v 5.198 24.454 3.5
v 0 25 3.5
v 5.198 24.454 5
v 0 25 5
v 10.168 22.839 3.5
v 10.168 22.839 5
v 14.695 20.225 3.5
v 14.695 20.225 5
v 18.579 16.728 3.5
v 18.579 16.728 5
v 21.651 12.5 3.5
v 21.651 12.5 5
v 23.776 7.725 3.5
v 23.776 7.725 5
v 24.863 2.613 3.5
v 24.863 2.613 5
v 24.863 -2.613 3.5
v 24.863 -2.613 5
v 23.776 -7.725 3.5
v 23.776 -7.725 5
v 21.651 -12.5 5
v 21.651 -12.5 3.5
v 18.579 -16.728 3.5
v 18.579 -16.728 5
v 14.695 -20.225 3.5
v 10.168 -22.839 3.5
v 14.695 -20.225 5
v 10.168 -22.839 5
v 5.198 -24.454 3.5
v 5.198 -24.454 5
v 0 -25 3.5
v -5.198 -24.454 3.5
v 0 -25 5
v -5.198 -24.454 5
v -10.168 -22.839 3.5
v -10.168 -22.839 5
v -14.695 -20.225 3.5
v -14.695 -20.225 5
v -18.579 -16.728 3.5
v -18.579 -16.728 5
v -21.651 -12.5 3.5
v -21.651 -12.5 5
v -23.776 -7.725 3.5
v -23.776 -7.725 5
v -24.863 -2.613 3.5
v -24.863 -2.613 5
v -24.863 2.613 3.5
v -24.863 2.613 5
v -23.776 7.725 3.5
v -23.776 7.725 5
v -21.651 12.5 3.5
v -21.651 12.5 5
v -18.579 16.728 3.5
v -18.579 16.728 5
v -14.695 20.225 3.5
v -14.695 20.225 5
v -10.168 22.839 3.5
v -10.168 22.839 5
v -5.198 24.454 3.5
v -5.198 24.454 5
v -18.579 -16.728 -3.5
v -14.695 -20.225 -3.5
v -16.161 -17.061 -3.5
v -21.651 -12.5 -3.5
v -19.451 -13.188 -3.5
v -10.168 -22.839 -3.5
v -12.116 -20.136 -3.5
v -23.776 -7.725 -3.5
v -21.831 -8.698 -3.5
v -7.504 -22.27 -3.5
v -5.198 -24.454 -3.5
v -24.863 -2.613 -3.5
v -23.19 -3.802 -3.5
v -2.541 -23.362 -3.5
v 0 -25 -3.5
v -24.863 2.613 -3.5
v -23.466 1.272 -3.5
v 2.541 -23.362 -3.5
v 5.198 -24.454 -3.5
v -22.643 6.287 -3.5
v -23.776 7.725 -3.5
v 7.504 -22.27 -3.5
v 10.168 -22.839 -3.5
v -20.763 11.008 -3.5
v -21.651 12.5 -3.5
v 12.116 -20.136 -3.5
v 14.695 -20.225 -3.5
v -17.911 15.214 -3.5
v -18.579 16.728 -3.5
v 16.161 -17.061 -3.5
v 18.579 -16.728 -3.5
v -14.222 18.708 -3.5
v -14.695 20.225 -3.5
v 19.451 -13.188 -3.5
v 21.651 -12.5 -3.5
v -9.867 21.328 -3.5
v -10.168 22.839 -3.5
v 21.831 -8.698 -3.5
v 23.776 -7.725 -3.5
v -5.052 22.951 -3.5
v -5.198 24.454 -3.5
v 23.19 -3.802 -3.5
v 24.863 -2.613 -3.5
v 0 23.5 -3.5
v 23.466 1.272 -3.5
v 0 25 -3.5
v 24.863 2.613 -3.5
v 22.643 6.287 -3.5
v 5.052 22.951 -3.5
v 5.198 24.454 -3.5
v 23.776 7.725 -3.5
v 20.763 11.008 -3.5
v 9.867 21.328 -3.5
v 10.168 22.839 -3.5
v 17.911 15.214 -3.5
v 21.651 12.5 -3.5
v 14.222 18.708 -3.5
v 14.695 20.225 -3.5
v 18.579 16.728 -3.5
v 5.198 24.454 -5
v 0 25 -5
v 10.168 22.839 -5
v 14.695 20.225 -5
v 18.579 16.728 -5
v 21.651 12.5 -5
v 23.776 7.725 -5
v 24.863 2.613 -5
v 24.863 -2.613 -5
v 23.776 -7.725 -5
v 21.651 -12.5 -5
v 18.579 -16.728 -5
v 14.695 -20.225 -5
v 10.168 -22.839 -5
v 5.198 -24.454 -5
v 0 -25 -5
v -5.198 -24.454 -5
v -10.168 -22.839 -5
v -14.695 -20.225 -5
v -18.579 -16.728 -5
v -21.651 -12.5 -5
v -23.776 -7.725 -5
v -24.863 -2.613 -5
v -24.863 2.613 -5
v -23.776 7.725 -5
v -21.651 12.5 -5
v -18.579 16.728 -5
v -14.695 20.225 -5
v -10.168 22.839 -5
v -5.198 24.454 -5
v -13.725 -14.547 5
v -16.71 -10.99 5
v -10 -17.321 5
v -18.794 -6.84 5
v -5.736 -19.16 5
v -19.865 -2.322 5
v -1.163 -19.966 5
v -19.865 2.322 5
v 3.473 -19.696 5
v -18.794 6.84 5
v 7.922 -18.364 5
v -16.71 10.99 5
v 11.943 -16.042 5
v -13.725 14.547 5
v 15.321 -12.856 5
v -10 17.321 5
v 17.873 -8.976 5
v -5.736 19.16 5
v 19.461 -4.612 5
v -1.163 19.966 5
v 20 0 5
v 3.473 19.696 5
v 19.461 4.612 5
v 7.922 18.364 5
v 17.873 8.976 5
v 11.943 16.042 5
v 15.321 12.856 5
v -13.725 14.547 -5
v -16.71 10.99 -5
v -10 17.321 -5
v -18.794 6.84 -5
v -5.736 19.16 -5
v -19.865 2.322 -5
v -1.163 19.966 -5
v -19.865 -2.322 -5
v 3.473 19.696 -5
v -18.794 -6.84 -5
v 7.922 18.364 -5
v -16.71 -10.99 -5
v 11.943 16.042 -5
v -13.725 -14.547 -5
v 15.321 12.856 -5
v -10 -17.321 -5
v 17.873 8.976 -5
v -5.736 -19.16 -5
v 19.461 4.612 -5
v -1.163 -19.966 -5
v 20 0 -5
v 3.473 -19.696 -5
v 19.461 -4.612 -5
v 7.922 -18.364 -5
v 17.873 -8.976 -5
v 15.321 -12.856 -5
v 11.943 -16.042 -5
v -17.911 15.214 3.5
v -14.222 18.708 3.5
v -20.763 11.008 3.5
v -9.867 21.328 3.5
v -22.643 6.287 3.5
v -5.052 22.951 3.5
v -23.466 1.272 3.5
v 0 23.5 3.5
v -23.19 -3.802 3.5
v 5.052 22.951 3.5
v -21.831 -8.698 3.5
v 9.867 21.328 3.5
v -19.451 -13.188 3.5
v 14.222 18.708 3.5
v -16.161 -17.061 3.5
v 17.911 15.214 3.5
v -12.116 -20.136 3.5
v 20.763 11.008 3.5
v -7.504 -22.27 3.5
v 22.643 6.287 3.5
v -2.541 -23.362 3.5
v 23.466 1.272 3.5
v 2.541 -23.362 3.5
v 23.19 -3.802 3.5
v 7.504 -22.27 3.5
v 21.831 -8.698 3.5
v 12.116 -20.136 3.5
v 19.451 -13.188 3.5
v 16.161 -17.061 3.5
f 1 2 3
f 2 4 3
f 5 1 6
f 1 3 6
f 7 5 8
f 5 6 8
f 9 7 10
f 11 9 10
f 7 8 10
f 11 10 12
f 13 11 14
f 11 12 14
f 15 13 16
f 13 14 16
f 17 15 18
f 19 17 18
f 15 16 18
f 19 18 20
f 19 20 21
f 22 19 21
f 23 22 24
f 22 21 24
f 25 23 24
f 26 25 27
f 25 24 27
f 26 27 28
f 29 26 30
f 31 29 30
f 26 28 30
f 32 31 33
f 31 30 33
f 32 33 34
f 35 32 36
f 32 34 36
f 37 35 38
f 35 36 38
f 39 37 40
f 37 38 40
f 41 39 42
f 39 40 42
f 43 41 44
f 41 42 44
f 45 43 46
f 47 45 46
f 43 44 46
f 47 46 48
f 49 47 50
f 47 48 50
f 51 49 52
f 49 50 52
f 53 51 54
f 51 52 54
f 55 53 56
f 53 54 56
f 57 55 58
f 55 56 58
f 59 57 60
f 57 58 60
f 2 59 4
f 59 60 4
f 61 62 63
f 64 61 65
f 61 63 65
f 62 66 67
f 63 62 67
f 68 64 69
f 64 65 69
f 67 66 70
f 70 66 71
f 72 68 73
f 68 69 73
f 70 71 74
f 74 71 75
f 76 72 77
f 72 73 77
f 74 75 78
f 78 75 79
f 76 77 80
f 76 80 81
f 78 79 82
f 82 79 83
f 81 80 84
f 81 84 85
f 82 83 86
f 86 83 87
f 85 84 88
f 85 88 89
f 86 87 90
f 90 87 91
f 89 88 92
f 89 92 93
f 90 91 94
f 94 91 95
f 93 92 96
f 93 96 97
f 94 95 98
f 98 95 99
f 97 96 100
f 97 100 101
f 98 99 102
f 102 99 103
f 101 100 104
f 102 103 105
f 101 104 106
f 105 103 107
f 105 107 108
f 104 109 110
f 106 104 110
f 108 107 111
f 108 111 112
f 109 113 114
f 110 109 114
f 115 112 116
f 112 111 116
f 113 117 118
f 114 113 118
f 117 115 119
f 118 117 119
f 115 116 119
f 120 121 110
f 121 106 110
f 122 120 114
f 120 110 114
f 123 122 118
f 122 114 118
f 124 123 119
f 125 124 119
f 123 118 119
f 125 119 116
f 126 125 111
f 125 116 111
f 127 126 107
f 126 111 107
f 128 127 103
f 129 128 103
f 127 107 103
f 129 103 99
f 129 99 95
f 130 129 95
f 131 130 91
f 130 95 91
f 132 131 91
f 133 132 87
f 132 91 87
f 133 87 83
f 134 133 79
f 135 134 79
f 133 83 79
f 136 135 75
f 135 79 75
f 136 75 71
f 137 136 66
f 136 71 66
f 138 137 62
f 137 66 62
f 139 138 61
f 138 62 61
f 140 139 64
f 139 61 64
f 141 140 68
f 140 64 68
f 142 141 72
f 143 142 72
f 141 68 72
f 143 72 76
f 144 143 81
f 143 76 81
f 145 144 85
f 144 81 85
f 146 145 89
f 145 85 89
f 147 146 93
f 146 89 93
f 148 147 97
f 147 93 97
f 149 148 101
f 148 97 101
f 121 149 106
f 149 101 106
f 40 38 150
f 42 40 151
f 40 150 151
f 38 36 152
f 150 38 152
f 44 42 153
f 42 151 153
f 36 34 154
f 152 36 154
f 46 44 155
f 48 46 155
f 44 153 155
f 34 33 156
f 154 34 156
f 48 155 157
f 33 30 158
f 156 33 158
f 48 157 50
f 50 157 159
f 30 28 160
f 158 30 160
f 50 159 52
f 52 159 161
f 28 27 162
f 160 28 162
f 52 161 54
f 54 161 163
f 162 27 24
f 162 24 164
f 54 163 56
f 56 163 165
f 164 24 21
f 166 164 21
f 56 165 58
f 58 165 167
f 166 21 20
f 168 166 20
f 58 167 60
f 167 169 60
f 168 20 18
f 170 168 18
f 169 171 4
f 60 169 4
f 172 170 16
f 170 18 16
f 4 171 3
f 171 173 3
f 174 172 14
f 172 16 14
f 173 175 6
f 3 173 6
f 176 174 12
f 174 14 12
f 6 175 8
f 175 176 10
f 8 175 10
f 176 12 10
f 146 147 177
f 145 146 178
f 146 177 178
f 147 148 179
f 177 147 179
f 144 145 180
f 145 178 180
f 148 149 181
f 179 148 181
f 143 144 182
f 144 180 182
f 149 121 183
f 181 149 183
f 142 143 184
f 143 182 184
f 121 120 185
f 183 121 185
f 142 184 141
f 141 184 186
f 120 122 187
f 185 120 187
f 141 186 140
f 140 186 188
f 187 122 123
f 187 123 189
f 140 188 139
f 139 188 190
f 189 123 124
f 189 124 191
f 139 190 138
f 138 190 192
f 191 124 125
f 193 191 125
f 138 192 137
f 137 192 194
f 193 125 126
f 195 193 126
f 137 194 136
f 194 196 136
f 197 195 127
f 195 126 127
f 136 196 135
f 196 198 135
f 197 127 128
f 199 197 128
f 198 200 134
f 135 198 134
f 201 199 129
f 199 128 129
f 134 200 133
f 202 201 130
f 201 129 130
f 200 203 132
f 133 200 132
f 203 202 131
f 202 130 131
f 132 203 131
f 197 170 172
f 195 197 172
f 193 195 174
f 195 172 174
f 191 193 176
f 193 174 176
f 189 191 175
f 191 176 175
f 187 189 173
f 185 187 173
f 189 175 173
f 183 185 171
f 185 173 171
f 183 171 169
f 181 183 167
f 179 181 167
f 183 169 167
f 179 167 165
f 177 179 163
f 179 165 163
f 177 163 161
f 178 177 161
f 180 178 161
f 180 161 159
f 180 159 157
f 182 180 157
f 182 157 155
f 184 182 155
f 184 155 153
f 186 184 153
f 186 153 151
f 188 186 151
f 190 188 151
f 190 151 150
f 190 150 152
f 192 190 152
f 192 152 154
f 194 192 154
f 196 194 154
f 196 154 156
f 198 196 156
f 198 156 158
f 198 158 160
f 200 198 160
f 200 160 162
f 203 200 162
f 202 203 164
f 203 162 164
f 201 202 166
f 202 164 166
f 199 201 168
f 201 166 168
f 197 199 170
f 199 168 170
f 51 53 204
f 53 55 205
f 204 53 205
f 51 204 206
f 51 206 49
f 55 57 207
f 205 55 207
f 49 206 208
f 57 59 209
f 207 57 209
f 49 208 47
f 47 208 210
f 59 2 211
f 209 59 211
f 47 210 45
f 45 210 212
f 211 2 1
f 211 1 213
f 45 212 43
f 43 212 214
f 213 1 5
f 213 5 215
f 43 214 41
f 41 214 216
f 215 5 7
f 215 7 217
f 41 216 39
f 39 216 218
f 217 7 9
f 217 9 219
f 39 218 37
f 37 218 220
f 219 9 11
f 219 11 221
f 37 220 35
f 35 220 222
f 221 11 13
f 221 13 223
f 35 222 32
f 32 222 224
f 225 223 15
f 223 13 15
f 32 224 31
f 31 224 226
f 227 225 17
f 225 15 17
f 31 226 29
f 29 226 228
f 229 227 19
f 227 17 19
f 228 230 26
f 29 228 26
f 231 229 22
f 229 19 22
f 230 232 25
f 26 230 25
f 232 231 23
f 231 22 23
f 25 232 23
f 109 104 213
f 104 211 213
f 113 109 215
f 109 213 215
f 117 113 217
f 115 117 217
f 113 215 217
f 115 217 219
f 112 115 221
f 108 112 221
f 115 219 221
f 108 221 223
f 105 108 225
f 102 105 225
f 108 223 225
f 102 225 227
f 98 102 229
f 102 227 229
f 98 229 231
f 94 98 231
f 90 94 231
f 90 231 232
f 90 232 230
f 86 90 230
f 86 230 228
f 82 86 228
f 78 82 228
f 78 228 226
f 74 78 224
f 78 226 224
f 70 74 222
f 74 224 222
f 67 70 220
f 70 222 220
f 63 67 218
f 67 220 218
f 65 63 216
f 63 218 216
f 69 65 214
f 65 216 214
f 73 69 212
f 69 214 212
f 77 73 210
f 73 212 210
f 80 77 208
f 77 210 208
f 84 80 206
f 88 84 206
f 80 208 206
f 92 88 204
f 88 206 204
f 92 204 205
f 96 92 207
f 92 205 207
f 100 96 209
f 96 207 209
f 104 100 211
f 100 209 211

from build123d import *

# Parameters (mm, degrees)
F2_R     = 20
F3_DEPTH = 10.001


with BuildPart() as f1:
    # F0 (on Right) → F1 (revolve)
    with BuildSketch(Plane.YZ):
        Polygon((25, 5), (0, 5), (0, -5), (25, -5), (25, -3.5), (23.5, -3.5), (23.5, 3.5), (25, 3.5), align=None)
    revolve(axis=Axis((0, 0, 0), (0, 0, -1)))

    # F2 (on face) → F3 (cut, through all)
    with BuildSketch(Plane.XY.offset(5)):
        Circle(F2_R)
    extrude(amount=-F3_DEPTH, mode=Mode.SUBTRACT)


solid = f1.part
